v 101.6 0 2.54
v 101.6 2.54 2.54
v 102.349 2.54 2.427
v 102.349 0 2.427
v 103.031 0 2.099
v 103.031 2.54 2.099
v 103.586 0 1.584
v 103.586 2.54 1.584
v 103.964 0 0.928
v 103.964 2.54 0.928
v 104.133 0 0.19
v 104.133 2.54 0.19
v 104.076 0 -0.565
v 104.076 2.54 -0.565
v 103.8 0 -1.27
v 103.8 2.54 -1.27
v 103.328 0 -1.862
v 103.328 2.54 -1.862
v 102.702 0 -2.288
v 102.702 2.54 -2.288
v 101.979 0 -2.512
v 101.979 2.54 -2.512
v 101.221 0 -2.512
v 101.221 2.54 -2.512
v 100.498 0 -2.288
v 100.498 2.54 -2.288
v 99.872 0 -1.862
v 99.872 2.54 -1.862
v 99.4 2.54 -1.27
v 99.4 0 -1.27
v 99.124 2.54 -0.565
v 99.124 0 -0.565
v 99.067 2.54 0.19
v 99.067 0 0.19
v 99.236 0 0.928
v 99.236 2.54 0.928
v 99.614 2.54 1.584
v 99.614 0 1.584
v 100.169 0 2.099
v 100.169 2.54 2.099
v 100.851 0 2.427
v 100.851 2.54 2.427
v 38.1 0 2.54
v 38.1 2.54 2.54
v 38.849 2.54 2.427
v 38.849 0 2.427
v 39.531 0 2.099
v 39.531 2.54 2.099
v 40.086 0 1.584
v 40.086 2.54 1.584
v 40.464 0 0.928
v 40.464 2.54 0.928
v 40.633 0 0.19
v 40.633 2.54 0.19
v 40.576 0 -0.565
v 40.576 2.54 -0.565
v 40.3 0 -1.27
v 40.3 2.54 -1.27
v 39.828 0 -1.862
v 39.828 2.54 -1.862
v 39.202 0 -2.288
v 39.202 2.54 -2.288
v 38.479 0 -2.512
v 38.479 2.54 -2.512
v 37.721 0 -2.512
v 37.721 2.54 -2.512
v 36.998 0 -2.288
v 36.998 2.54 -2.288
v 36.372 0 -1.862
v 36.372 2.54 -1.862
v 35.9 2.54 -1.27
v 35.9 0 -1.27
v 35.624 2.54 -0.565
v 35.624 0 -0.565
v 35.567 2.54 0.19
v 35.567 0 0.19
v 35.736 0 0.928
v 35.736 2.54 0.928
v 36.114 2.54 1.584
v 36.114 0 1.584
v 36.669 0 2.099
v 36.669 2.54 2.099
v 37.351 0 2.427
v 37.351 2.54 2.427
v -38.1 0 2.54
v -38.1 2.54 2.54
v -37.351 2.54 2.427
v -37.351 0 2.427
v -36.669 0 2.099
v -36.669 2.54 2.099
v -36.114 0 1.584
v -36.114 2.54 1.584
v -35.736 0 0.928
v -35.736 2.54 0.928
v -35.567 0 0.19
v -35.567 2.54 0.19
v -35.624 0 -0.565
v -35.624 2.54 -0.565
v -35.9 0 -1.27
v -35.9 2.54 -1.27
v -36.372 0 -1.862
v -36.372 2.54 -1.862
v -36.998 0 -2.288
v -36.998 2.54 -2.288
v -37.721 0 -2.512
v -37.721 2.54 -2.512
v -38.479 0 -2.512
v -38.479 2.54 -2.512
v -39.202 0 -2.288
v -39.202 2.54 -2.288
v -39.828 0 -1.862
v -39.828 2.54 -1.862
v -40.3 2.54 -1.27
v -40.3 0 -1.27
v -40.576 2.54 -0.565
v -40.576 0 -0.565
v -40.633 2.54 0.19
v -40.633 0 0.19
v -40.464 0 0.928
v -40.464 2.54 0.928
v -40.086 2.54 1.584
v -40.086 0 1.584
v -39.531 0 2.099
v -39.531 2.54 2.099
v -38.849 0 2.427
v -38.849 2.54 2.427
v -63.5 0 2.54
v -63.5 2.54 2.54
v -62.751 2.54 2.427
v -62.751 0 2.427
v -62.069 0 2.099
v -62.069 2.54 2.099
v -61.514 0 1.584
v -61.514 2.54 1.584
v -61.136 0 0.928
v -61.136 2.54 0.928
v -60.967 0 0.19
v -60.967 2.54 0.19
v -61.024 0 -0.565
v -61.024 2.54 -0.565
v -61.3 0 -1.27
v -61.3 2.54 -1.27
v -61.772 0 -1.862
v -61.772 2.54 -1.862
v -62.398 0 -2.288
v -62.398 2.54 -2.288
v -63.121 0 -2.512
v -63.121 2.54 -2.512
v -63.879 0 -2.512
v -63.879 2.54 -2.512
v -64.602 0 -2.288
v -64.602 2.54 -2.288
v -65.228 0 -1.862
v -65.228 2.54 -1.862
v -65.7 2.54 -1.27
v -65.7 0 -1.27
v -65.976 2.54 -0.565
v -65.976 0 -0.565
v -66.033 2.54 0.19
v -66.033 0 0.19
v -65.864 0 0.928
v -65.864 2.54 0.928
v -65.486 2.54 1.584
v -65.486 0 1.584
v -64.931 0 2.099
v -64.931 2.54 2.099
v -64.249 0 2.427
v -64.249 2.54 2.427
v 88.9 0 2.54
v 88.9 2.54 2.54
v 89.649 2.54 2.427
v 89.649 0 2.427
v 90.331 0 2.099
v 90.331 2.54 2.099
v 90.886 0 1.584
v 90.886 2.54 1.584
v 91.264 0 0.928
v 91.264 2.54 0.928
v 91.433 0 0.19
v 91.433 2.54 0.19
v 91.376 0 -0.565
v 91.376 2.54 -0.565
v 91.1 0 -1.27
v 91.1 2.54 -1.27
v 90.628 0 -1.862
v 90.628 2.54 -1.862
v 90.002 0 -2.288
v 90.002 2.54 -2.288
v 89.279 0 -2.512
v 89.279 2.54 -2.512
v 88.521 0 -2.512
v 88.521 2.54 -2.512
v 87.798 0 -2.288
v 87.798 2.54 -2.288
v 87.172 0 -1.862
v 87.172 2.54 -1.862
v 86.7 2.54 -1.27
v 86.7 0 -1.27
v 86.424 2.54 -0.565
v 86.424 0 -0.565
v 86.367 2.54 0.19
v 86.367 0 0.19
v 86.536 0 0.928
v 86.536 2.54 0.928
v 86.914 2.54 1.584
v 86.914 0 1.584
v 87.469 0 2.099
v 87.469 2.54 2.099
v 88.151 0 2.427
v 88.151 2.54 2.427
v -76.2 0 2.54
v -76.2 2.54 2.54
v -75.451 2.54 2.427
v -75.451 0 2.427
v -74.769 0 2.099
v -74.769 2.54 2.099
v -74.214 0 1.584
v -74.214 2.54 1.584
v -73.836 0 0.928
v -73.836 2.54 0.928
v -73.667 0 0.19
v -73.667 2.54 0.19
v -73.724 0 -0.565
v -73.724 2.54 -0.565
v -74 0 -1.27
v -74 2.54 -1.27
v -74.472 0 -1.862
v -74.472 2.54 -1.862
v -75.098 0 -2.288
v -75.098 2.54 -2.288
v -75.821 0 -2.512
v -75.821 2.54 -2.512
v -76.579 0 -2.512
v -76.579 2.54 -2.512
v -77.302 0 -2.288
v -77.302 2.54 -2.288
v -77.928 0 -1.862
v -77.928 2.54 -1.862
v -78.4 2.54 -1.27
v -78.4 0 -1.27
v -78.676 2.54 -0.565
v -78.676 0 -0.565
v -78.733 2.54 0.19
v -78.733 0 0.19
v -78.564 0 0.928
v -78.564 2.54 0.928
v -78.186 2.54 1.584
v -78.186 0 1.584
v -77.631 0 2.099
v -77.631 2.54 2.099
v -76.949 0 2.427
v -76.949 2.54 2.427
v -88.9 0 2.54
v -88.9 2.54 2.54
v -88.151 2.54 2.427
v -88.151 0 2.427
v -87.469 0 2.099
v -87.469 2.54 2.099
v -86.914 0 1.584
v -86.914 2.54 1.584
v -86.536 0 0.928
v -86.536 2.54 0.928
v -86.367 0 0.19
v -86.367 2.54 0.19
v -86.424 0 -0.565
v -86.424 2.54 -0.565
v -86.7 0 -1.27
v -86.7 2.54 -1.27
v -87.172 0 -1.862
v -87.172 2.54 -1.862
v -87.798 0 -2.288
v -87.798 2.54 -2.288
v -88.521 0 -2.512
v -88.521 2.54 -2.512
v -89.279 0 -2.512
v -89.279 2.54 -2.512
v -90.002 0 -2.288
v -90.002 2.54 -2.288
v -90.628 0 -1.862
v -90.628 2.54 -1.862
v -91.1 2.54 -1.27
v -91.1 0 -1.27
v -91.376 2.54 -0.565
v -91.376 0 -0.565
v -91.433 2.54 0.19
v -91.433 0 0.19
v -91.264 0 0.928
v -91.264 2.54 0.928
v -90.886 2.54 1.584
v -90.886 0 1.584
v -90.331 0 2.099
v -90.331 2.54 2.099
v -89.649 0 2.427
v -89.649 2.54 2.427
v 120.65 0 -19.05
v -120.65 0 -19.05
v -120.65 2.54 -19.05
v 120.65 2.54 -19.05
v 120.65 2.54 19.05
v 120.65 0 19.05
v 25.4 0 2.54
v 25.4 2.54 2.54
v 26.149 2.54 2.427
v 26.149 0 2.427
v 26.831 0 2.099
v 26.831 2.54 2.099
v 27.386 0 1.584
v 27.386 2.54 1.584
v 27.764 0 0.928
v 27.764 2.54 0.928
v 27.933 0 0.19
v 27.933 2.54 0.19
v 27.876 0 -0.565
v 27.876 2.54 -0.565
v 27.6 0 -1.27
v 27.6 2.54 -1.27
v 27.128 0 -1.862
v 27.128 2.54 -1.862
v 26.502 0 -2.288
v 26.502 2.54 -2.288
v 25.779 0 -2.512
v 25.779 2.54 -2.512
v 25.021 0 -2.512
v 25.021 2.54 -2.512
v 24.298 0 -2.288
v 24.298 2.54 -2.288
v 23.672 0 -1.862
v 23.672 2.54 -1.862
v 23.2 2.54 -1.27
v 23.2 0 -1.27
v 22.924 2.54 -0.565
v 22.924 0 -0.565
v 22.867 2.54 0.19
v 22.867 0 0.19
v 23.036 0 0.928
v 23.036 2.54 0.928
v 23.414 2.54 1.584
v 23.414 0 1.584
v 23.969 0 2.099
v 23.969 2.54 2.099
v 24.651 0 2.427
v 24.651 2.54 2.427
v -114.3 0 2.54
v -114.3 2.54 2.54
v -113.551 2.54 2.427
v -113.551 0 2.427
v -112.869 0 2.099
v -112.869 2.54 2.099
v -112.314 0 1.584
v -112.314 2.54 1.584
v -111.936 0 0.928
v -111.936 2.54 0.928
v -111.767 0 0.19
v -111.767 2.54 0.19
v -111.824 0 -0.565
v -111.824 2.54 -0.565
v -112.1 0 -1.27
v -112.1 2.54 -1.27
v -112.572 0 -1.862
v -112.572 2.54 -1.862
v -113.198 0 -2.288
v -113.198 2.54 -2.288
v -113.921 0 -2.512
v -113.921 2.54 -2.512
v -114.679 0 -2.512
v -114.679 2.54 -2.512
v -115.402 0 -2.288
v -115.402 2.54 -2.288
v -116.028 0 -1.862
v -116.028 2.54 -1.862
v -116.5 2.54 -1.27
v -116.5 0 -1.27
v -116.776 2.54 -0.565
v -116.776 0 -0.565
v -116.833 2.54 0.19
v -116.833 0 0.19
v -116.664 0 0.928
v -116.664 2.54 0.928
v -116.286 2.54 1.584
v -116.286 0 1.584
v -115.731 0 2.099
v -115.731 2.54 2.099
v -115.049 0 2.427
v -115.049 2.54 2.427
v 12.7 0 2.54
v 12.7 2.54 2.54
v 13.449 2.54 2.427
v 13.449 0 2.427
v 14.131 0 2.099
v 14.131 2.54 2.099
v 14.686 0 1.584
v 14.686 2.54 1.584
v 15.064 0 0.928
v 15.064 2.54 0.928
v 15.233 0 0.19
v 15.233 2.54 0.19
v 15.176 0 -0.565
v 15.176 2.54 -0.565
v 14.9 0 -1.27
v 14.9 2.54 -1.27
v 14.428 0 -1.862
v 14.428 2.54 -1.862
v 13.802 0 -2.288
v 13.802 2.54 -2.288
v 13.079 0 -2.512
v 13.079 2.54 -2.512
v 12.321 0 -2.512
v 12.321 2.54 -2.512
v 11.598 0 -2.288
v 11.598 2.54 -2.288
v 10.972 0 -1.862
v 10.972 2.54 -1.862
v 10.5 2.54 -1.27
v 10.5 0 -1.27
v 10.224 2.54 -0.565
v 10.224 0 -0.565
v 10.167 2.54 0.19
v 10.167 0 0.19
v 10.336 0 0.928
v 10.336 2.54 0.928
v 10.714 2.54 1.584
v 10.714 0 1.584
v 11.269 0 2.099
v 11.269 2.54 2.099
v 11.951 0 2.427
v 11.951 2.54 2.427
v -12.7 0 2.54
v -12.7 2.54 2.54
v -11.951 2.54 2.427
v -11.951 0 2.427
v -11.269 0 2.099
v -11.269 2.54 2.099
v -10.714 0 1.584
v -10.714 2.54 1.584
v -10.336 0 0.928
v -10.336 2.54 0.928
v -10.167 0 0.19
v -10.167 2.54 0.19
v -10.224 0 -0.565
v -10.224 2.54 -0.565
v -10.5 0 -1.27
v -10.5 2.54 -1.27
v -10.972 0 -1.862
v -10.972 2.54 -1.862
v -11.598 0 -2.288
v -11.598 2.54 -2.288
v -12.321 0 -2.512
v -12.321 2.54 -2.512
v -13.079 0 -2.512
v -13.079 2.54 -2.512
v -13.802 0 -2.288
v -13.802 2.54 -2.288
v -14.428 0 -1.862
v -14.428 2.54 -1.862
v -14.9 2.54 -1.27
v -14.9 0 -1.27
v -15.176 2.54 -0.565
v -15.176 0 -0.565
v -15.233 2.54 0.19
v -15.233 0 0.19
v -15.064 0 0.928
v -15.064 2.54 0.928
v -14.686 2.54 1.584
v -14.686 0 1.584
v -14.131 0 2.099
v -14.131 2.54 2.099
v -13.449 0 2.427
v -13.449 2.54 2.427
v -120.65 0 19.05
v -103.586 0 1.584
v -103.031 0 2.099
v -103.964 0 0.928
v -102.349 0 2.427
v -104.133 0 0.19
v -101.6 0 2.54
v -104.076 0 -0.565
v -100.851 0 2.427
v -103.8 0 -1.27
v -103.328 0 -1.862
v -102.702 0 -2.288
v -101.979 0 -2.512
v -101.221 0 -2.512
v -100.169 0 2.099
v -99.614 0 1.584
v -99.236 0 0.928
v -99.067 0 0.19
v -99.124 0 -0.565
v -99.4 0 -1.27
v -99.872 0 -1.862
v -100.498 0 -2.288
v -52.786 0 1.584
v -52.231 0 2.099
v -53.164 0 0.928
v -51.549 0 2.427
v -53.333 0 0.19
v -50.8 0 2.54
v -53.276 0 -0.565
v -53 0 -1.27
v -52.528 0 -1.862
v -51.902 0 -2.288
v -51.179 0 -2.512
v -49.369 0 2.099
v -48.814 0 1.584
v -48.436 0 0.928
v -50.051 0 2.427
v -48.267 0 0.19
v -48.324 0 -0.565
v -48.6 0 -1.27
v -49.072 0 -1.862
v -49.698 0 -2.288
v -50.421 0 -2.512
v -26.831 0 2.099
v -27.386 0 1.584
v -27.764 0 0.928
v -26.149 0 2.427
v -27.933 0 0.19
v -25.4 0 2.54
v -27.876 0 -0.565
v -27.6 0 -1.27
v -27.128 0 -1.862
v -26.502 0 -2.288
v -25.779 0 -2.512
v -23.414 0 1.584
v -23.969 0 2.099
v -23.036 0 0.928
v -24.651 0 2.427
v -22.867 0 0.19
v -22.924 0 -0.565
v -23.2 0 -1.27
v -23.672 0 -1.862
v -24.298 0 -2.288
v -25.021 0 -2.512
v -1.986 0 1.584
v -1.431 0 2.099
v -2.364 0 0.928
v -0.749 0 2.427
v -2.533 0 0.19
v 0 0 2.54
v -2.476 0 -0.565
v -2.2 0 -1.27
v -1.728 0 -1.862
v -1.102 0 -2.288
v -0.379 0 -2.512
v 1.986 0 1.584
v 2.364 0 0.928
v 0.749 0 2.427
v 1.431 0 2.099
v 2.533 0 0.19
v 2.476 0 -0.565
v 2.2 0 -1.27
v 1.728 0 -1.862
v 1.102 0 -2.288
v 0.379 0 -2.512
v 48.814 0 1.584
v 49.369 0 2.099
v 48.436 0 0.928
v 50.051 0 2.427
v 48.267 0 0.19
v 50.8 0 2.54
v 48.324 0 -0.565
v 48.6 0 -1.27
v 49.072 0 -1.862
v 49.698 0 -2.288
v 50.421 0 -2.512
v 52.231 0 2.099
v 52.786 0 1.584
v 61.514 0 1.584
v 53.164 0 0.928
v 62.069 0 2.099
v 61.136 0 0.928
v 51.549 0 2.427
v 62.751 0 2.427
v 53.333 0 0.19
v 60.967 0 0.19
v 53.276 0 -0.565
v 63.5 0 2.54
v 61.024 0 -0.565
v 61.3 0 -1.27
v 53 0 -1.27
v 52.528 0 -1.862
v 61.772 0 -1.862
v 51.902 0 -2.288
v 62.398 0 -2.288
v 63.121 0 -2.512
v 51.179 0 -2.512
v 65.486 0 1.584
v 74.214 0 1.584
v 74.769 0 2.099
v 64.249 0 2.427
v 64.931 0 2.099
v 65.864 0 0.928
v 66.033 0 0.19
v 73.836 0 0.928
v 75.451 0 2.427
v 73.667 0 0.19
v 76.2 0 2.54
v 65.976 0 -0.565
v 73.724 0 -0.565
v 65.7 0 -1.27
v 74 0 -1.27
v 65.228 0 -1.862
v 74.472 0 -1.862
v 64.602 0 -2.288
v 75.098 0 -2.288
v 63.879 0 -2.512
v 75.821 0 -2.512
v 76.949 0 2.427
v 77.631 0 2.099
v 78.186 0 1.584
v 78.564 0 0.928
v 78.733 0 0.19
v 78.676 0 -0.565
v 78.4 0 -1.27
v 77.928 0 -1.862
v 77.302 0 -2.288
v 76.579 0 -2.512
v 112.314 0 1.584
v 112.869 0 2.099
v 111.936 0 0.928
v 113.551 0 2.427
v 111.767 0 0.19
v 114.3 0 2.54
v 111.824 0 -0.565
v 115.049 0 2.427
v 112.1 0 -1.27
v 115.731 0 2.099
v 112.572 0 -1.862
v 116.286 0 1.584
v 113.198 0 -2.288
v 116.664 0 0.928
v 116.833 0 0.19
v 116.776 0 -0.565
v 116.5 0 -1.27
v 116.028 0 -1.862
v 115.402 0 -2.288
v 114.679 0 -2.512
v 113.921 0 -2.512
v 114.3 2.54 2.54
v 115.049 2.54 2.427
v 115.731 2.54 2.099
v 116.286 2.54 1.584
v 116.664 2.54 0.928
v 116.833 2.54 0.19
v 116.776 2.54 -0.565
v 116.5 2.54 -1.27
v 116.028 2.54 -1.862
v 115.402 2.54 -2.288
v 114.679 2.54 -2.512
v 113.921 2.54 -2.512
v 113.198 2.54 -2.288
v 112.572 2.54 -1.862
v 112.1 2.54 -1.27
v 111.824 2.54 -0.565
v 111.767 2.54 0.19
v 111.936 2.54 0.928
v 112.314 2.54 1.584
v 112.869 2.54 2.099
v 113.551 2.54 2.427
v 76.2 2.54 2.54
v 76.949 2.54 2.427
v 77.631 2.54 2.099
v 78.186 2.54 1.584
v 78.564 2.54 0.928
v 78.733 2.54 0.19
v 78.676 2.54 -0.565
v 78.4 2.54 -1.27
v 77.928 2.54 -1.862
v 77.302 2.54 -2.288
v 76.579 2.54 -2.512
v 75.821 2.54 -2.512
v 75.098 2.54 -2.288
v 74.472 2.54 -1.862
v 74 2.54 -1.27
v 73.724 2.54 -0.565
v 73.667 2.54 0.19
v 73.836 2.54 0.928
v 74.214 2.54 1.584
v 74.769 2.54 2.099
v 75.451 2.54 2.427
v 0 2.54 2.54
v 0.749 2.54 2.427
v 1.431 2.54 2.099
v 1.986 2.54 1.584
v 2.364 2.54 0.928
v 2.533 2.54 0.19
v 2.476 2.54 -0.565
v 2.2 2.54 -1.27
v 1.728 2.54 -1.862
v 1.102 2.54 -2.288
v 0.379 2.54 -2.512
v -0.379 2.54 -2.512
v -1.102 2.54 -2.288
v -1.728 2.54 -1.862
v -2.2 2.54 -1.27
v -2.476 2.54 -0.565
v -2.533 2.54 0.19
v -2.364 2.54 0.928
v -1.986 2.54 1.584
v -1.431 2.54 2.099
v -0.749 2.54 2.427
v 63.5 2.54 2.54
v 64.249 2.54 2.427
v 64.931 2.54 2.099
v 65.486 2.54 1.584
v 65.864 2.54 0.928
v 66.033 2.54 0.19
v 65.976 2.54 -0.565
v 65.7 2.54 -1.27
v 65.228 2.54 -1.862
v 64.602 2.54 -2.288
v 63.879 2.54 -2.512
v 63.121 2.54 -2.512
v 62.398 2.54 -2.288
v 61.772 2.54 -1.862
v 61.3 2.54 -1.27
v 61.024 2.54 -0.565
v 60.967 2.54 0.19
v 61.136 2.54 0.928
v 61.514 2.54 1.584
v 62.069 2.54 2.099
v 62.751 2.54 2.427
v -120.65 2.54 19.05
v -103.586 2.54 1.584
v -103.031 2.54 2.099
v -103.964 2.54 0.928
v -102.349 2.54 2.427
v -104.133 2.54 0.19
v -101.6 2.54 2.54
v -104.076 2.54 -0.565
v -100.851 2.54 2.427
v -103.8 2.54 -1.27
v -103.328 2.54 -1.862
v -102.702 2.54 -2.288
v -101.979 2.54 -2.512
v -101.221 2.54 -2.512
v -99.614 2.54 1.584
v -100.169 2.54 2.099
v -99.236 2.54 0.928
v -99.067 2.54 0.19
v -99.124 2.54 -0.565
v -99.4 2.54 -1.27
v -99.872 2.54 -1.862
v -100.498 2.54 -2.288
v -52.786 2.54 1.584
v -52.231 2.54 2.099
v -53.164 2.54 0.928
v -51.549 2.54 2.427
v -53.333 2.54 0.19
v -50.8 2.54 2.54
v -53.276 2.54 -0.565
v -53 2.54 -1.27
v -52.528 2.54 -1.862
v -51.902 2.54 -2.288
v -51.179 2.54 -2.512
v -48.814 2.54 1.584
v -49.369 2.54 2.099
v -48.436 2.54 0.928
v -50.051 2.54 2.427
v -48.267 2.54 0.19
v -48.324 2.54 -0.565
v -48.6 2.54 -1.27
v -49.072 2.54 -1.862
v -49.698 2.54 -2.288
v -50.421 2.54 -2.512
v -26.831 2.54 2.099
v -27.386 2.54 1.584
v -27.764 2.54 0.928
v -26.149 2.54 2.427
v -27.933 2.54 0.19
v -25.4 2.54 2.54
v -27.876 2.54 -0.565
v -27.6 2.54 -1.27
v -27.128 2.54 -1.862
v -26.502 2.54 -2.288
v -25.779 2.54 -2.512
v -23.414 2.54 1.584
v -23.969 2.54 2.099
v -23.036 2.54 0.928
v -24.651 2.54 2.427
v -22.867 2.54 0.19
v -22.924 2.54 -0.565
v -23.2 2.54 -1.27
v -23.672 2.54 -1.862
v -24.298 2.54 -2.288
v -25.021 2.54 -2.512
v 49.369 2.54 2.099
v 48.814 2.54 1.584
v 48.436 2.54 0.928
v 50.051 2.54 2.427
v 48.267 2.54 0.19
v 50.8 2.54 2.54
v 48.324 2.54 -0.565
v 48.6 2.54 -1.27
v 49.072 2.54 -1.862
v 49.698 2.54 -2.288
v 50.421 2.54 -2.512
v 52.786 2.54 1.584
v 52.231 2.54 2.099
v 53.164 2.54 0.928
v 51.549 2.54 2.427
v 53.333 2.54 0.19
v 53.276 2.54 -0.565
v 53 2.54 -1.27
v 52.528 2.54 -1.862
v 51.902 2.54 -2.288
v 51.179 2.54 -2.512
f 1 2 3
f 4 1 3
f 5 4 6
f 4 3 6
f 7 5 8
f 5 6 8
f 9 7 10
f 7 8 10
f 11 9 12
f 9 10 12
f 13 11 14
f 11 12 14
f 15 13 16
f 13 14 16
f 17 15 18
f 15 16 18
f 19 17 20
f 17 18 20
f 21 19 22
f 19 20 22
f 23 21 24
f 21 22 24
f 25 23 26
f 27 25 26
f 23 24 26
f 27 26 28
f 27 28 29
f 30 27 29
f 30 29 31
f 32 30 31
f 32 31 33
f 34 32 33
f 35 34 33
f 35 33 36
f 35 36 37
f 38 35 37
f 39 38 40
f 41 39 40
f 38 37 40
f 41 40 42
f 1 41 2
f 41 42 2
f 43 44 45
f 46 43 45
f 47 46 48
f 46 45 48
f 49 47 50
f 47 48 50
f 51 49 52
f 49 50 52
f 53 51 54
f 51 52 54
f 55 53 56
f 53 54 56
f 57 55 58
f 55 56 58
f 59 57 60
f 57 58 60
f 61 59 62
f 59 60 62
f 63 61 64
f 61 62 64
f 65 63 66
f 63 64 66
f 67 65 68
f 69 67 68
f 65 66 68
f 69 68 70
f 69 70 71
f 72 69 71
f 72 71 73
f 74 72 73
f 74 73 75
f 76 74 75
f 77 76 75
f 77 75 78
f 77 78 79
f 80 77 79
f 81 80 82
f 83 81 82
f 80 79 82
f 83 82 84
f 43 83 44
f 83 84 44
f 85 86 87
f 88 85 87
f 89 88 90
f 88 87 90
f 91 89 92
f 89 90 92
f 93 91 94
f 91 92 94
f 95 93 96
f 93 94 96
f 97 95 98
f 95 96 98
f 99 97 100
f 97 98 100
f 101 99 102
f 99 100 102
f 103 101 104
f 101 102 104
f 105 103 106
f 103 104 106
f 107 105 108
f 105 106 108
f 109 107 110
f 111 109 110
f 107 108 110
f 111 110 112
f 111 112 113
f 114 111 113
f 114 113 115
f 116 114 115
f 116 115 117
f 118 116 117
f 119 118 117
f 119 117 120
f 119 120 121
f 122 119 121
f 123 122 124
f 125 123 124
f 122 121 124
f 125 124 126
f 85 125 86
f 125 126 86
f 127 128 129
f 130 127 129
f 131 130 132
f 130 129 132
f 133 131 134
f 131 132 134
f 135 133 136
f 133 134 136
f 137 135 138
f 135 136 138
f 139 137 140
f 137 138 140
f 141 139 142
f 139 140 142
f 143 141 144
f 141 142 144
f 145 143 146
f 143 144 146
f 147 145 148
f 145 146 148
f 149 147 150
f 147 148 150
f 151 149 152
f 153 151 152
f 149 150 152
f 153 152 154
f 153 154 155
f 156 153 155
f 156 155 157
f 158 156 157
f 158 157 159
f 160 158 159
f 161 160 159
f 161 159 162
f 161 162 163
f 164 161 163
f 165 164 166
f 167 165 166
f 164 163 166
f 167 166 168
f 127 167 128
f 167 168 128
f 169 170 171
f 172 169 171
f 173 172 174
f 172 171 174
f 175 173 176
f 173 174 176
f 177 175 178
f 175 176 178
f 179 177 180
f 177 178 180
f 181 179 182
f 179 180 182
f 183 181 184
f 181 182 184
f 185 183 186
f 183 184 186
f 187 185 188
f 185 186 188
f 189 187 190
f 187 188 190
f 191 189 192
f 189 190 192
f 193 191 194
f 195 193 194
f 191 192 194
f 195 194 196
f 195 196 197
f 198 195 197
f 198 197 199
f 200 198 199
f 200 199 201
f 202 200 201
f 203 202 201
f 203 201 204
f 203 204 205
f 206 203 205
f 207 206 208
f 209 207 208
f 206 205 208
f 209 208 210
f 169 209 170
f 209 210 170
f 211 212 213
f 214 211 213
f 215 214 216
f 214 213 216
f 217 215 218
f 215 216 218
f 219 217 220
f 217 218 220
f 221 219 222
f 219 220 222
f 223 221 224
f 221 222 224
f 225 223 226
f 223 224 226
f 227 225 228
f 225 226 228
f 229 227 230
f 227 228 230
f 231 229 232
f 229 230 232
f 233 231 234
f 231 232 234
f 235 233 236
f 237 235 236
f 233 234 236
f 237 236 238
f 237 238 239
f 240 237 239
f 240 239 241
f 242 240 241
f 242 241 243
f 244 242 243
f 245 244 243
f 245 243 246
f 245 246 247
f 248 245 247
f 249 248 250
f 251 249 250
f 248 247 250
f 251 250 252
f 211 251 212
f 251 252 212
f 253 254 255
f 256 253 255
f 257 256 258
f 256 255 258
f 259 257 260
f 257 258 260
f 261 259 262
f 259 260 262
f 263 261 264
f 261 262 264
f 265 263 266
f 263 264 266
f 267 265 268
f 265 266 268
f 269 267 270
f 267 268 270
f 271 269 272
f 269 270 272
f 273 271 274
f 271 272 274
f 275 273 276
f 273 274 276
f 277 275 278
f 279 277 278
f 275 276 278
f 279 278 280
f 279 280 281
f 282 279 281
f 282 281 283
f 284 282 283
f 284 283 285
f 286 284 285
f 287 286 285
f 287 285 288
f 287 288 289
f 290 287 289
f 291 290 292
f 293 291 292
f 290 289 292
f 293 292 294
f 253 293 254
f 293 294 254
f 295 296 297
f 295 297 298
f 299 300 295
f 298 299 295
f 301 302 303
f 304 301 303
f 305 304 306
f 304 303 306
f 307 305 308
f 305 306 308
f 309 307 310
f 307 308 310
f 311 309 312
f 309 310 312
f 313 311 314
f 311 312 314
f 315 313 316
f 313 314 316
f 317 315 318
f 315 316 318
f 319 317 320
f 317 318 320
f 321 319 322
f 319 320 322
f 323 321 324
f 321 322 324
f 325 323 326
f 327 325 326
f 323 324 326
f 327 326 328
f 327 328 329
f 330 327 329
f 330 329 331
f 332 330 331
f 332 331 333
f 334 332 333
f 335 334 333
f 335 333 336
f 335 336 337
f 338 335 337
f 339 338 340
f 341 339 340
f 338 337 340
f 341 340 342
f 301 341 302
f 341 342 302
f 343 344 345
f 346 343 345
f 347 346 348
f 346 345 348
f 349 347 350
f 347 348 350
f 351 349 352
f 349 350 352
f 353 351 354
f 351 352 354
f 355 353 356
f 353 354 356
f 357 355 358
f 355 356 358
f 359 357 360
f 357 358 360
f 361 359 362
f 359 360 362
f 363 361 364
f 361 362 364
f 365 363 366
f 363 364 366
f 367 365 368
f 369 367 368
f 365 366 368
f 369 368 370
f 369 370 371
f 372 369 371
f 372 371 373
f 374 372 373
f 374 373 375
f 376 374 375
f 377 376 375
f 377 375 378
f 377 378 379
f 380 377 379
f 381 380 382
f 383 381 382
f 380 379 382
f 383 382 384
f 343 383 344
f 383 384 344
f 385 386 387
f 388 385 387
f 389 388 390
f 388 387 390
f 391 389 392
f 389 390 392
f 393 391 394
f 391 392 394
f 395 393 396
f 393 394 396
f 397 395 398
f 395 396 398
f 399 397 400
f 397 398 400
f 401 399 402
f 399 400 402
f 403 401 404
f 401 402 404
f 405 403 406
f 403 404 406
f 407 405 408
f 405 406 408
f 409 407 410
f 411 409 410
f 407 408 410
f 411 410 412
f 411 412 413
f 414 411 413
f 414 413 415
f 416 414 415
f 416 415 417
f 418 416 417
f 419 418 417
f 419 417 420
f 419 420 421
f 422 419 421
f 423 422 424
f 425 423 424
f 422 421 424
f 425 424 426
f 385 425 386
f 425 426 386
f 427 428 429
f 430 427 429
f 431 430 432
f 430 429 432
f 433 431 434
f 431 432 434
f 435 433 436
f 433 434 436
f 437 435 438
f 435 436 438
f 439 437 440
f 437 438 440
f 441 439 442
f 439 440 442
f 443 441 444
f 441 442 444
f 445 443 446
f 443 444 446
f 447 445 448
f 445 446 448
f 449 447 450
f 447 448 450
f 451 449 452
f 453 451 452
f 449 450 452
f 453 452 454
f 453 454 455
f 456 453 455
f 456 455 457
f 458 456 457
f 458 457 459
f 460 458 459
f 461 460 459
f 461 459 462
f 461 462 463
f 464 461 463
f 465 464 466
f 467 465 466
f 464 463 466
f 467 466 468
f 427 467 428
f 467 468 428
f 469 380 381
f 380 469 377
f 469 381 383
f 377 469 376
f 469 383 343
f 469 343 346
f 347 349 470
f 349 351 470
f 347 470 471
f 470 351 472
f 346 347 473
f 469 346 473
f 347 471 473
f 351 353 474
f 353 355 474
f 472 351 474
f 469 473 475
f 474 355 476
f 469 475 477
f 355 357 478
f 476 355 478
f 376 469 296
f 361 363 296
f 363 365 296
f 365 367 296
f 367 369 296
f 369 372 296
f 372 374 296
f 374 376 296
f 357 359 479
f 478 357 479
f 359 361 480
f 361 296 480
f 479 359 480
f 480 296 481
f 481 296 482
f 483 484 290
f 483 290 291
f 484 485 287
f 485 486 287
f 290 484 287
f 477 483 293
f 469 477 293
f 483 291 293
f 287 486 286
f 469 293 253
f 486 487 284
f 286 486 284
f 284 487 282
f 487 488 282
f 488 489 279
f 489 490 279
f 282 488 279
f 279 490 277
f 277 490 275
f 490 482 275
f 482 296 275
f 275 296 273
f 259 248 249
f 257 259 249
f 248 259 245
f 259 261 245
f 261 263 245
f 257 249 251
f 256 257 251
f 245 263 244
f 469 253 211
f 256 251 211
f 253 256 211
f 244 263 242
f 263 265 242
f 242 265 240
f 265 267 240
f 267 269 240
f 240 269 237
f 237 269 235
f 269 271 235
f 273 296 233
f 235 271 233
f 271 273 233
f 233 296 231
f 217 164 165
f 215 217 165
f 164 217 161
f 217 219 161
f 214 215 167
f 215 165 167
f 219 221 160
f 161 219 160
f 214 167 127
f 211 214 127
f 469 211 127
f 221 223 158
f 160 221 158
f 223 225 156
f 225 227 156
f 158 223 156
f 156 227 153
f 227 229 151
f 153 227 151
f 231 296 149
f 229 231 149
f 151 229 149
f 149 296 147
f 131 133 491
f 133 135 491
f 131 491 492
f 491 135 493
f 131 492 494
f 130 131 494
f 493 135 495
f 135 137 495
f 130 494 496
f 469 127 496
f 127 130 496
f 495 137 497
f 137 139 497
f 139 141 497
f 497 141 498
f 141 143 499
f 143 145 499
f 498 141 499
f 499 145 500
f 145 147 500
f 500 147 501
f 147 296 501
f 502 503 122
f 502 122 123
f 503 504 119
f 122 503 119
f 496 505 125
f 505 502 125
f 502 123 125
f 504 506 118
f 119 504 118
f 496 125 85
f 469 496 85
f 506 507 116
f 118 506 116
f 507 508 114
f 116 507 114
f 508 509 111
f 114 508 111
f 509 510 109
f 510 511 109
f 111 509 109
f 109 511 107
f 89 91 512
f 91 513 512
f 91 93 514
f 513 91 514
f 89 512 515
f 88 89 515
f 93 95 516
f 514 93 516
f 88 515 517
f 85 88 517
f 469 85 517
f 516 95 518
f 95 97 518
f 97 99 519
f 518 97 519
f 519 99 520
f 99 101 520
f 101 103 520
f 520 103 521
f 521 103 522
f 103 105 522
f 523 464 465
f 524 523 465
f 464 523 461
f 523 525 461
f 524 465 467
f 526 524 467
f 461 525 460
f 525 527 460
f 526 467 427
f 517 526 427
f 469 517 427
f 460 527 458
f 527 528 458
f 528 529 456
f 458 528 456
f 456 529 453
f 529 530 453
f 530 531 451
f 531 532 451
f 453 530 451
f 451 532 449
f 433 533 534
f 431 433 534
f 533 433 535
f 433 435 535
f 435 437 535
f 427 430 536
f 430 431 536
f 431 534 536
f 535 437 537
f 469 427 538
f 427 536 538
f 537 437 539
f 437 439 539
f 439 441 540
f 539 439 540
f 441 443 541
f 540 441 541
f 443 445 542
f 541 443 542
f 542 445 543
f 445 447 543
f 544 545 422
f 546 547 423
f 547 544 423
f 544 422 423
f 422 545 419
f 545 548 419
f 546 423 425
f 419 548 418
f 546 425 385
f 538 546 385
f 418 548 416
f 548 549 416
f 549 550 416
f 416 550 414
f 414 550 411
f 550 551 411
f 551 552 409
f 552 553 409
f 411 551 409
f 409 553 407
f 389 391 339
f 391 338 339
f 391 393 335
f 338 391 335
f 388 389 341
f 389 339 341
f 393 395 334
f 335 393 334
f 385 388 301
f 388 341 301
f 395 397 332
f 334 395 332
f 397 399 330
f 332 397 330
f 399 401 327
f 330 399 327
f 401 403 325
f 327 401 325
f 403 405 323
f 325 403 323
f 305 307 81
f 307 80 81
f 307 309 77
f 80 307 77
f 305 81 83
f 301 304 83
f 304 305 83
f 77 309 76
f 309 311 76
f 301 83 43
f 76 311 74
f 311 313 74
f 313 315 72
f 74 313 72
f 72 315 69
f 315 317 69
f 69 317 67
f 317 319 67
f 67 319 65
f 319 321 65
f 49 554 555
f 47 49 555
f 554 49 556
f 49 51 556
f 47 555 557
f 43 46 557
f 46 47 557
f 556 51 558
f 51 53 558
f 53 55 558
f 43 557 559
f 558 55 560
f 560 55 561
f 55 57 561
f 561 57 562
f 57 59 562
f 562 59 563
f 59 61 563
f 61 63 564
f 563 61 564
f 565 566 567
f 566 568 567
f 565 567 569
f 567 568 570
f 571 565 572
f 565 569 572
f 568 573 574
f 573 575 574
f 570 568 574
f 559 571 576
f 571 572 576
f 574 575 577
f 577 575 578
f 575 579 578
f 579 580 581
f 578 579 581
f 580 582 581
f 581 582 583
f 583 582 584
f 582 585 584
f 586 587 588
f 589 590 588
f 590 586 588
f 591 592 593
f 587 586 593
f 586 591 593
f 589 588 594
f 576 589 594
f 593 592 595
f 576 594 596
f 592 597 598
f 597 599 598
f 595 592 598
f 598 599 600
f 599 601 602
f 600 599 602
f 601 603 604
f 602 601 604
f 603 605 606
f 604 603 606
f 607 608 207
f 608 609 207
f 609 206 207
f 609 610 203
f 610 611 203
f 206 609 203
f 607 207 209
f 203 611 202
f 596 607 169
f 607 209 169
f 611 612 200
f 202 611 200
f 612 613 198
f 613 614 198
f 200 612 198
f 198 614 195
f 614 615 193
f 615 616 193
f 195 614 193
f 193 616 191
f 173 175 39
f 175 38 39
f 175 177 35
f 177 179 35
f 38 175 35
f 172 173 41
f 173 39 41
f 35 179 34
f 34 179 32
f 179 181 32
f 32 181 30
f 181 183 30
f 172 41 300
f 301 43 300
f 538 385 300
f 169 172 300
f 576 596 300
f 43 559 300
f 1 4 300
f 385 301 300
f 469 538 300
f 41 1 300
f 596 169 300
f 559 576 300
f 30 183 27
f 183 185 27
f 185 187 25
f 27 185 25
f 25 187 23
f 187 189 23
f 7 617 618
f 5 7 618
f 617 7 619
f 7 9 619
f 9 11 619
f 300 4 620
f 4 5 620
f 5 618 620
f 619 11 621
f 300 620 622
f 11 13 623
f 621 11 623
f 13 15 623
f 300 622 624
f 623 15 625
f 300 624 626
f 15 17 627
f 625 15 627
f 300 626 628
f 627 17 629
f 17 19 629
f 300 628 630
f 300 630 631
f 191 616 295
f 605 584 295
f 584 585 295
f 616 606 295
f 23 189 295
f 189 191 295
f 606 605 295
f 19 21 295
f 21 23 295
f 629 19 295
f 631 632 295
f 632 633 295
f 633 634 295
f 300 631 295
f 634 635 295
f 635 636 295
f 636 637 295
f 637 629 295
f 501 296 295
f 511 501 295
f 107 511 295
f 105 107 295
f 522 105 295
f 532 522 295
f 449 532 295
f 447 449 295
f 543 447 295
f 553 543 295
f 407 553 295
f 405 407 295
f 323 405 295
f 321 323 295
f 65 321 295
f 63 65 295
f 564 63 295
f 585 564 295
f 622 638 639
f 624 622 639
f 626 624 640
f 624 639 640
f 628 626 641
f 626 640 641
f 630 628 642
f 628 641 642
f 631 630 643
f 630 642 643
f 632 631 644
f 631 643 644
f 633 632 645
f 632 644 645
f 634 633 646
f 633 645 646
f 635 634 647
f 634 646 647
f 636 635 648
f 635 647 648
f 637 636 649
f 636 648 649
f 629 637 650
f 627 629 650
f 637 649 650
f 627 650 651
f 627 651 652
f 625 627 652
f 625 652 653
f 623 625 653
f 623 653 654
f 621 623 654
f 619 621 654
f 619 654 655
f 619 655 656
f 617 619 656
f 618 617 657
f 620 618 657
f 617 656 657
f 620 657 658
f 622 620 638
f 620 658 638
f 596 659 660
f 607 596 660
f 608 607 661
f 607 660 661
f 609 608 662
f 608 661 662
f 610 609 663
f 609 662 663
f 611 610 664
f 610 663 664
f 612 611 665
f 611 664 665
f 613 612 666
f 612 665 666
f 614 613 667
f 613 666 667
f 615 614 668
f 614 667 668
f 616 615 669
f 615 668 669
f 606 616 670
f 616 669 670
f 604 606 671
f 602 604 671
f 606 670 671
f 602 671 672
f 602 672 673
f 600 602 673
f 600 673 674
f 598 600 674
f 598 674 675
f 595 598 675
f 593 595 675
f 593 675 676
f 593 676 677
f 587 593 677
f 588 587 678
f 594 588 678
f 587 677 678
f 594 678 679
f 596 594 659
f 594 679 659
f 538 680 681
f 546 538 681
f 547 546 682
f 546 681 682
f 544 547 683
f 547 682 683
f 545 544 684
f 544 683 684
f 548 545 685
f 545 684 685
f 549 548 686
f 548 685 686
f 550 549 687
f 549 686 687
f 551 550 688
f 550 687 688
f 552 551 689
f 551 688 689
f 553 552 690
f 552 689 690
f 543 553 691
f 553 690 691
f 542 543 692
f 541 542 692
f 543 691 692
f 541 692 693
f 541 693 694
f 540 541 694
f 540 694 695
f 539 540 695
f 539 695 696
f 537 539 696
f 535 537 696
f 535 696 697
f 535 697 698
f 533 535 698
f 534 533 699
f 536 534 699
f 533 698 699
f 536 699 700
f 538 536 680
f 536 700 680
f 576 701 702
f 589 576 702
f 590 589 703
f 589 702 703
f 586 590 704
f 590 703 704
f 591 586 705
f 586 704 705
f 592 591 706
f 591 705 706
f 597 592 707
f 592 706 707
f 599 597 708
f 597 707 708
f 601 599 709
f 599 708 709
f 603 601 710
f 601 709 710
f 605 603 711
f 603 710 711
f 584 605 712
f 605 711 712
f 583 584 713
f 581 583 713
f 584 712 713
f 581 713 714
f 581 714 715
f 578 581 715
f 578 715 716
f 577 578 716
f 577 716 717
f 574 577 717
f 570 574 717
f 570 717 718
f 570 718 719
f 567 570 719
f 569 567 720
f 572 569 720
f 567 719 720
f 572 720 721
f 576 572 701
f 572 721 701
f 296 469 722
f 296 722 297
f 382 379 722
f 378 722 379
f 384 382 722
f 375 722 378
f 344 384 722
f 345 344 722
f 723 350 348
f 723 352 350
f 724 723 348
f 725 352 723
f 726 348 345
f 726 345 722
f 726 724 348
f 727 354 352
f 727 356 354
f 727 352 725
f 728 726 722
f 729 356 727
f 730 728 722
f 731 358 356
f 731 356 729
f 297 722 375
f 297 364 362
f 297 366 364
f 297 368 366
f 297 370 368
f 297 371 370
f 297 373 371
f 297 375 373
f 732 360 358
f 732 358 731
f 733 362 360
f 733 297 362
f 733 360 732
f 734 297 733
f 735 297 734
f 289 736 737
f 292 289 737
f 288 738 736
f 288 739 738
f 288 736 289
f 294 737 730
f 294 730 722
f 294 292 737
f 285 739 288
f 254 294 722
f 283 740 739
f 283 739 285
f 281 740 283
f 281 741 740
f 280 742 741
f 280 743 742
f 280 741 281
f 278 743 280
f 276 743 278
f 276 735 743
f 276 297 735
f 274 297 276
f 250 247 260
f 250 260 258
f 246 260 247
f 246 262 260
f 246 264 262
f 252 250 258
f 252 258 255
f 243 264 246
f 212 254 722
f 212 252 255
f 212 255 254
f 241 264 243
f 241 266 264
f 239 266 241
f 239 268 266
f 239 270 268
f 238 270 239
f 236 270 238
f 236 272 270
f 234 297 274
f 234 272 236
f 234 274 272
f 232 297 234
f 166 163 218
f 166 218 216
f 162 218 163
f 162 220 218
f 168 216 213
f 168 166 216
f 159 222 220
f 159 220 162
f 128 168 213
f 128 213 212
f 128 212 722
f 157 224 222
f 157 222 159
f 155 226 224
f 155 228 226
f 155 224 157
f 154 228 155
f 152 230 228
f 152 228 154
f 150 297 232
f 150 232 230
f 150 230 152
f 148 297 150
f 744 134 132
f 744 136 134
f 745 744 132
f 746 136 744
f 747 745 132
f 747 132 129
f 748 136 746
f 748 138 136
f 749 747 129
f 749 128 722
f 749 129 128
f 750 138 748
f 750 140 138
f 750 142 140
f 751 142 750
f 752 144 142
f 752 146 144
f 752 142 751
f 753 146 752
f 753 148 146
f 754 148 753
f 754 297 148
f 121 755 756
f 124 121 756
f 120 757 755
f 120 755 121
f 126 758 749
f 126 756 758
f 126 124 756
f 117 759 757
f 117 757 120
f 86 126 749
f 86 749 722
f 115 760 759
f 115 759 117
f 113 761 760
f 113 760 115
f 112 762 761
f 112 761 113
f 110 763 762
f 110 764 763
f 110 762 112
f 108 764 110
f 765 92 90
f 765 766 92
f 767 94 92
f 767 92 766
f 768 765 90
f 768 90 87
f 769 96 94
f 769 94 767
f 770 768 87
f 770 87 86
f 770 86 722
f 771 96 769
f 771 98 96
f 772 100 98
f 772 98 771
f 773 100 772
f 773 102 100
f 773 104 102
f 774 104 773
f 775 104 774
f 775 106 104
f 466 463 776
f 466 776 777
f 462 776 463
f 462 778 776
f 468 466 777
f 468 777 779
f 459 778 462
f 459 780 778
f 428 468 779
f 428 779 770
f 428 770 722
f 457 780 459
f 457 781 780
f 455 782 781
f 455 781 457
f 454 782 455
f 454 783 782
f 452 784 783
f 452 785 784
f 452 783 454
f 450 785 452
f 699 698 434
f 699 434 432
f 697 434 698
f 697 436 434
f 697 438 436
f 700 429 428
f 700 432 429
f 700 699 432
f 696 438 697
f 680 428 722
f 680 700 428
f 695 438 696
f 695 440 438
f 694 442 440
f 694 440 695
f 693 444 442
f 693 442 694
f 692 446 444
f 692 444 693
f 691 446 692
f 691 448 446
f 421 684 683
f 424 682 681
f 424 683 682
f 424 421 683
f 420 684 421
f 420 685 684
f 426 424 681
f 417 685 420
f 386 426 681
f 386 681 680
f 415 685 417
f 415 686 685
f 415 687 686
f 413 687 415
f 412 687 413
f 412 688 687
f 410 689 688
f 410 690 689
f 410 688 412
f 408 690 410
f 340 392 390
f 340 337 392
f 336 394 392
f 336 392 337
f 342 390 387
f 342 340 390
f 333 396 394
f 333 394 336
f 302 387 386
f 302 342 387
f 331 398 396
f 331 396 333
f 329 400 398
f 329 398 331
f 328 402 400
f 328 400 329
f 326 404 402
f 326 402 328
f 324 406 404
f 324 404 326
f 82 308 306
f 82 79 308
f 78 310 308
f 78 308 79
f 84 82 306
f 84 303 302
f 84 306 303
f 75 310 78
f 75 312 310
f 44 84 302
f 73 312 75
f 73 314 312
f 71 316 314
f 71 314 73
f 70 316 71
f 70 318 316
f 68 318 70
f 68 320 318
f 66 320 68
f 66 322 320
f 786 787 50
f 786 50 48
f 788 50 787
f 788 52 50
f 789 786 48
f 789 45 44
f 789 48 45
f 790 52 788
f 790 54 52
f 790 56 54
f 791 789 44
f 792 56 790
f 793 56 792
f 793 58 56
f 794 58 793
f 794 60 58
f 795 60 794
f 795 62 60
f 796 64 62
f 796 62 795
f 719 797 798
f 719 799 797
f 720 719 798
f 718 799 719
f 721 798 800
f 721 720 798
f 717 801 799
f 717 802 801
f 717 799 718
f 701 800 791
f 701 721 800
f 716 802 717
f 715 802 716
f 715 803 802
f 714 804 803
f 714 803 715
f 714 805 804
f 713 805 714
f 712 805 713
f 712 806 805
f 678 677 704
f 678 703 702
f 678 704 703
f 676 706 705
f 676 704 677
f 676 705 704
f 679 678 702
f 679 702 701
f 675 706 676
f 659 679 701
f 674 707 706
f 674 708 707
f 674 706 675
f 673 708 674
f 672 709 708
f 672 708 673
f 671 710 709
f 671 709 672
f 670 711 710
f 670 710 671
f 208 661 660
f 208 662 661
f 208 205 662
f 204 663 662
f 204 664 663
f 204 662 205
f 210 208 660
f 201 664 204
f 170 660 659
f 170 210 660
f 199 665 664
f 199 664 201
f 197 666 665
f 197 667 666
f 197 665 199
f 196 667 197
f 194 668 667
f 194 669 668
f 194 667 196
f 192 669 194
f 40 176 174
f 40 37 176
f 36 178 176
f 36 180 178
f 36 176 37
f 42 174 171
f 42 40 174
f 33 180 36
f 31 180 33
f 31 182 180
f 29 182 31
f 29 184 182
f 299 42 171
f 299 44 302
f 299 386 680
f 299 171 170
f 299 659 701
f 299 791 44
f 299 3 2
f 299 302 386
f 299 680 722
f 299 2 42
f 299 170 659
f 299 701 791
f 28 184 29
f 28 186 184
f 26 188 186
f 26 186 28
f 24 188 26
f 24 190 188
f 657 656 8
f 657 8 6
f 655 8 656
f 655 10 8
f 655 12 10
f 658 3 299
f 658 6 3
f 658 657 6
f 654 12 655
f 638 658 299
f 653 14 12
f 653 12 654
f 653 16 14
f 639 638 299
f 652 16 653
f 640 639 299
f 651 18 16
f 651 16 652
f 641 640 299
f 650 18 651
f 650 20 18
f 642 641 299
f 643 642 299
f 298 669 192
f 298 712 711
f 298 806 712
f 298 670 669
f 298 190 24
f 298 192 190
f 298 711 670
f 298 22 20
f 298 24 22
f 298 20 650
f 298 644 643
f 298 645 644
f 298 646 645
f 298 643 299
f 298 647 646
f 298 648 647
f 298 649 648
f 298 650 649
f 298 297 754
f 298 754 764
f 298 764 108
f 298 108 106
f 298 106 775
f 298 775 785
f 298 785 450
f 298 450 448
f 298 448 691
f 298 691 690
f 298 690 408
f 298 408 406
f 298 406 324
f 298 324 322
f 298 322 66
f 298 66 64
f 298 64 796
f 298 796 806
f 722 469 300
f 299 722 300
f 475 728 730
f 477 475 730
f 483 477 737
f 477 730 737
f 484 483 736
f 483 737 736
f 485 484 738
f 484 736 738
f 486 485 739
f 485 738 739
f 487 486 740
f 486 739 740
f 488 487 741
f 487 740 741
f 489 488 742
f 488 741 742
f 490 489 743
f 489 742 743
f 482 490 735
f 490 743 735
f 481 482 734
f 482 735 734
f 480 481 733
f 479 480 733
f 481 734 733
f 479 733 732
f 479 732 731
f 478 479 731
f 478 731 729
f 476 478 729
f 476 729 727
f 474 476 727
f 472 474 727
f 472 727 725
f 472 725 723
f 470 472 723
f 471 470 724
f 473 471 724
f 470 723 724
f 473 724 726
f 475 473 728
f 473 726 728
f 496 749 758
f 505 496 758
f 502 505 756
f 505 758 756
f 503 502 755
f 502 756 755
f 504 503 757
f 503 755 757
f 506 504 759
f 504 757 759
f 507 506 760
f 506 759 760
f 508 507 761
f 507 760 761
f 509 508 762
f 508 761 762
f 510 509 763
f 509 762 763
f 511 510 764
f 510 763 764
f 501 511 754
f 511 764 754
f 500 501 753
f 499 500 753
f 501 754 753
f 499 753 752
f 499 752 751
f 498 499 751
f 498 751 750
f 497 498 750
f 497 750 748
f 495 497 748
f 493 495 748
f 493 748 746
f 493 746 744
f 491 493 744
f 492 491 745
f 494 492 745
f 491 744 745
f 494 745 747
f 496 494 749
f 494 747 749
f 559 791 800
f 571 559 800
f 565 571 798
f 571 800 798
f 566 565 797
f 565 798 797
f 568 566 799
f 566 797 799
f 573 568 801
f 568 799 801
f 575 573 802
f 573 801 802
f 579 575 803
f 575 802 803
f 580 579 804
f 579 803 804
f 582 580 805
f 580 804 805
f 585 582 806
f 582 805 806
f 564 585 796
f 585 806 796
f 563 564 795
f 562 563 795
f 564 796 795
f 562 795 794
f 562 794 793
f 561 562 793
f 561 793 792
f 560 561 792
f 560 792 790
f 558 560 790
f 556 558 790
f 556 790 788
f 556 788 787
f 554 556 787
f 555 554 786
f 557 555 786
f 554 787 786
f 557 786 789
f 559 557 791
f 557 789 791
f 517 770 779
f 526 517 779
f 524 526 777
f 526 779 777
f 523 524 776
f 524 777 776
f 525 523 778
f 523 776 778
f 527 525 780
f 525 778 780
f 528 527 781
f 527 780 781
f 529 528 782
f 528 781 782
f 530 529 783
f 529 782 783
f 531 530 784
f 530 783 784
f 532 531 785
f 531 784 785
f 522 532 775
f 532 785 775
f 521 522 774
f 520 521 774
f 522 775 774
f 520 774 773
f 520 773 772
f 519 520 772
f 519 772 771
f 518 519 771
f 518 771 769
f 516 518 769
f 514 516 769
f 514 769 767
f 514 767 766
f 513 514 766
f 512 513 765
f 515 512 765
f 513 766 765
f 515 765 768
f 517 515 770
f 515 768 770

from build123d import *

# Parameters (mm, degrees)
SKETCH1_W           = 241.3
SKETCH1_H           = 38.1
BOSS_EXTRUDE1_DEPTH = 2.54
SKETCH2_R           = 2.54
CUT_EXTRUDE1_DEPTH  = 2.54
LPATTERN1_COUNT     = 19
LPATTERN1_PITCH     = 12.7


with BuildPart() as part:
    # Sketch1 → Boss-Extrude1 (new body)
    with BuildSketch(Plane(origin=(0, 0, 0), x_dir=(1, 0, 0), z_dir=(0, 1, 0))):
        Rectangle(SKETCH1_W, SKETCH1_H)
    extrude(amount=BOSS_EXTRUDE1_DEPTH)

    # Sketch2 → Cut-Extrude1 (cut)
    with BuildSketch(Plane(origin=(0, 2.54, 0), x_dir=(1, 0, 0), z_dir=(0, 1, 0))):
        with Locations(Location((-114.3, 0, 0), (0, 0, 270))):
            Circle(SKETCH2_R)
    cut_extrude1 = extrude(amount=-CUT_EXTRUDE1_DEPTH, mode=Mode.SUBTRACT)

    # LPattern1: Cut-Extrude1 ×19
    with Locations(*[(i * LPATTERN1_PITCH, 0, 0) for i in range(1, LPATTERN1_COUNT)]):
        add(cut_extrude1, mode=Mode.SUBTRACT)


solid = part.part
